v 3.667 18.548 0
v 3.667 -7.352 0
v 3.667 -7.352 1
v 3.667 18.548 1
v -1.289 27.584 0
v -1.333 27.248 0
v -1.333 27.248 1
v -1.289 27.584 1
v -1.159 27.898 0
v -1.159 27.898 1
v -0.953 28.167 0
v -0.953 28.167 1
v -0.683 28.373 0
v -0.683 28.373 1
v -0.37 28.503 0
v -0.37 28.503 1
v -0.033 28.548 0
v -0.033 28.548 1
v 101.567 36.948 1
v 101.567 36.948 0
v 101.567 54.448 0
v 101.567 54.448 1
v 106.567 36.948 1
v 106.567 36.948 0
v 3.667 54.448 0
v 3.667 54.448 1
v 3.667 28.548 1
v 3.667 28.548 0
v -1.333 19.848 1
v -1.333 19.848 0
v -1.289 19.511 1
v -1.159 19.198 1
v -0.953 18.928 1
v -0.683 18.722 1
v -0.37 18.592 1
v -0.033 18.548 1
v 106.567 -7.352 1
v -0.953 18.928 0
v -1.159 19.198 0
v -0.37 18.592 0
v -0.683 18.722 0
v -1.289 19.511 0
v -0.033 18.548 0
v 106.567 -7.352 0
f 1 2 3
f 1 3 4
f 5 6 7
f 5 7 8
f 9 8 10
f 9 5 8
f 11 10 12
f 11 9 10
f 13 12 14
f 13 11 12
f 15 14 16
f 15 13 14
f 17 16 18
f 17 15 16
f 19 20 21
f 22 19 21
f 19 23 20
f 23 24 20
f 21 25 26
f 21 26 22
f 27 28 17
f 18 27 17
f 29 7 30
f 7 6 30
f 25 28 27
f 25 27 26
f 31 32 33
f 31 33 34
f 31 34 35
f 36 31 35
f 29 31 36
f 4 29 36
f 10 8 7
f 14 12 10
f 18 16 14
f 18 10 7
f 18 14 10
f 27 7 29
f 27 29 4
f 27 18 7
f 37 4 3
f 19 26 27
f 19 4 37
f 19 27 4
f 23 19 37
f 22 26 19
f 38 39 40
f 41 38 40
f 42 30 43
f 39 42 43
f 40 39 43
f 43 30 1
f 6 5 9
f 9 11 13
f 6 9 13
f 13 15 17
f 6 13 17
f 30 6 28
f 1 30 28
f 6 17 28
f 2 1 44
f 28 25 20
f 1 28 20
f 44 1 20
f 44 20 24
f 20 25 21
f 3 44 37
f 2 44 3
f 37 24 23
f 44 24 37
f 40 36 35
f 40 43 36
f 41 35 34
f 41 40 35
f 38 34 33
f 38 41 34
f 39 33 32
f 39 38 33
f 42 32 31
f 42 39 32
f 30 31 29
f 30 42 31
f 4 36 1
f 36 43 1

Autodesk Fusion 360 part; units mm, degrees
sketch "Sketch1" plane through (0, 0, 0) normal (0, 0, 1) x (1, 0, 0)
  line L0 (3.6667, 54.4476) -> (106.5667, 54.4476)
  line L1 (106.5667, 54.4476) -> (106.5667, -7.3524)
  line L2 (106.5667, -7.3524) -> (3.6667, -7.3524)
  line L3 (3.6667, -7.3524) -> (3.6667, 54.4476)
  line L4 (3.6667, 23.5476) -> (106.5667, 23.5476) construction
  line L5 (3.6667, 28.5476) -> (-0.0333, 28.5476)
  line L6 (-1.3333, 27.2476) -> (-1.3333, 19.8476)
  line L7 (-0.0333, 18.5476) -> (3.6667, 18.5476)
  line L8 (3.6667, 18.5476) -> (3.6667, 28.5476)
  arc A0 (-0.0333, 28.5476) -> (-1.3333, 27.2476) centre (-0.0333, 27.2476) ccw
  arc A1 (-1.3333, 19.8476) -> (-0.0333, 18.5476) centre (-0.0333, 19.8476) ccw
  line L9 (101.5667, 54.4476) -> (106.5667, 54.4476)
  line L10 (106.5667, 54.4476) -> (106.5667, 36.9476)
  line L11 (106.5667, 36.9476) -> (101.5667, 36.9476)
  line L12 (101.5667, 36.9476) -> (101.5667, 54.4476)
  point P0 (-1.3333, 28.5476)
  point P1 (-1.3333, 18.5476)
  dimension "d1" = 102.9
  dimension "d2" = 61.8
  dimension "d7" = 10
  dimension "d8" = 5
  dimension "d9" = 1.3
  dimension "d12" = 5
  dimension "d13" = 17.5
extrude "Extrude1" add sketch "Sketch1" along normal blind 1 contours L0 L1 L2 L3 L8 L11 L12 | L3 L5 L6 L7 L8 A0 A1
